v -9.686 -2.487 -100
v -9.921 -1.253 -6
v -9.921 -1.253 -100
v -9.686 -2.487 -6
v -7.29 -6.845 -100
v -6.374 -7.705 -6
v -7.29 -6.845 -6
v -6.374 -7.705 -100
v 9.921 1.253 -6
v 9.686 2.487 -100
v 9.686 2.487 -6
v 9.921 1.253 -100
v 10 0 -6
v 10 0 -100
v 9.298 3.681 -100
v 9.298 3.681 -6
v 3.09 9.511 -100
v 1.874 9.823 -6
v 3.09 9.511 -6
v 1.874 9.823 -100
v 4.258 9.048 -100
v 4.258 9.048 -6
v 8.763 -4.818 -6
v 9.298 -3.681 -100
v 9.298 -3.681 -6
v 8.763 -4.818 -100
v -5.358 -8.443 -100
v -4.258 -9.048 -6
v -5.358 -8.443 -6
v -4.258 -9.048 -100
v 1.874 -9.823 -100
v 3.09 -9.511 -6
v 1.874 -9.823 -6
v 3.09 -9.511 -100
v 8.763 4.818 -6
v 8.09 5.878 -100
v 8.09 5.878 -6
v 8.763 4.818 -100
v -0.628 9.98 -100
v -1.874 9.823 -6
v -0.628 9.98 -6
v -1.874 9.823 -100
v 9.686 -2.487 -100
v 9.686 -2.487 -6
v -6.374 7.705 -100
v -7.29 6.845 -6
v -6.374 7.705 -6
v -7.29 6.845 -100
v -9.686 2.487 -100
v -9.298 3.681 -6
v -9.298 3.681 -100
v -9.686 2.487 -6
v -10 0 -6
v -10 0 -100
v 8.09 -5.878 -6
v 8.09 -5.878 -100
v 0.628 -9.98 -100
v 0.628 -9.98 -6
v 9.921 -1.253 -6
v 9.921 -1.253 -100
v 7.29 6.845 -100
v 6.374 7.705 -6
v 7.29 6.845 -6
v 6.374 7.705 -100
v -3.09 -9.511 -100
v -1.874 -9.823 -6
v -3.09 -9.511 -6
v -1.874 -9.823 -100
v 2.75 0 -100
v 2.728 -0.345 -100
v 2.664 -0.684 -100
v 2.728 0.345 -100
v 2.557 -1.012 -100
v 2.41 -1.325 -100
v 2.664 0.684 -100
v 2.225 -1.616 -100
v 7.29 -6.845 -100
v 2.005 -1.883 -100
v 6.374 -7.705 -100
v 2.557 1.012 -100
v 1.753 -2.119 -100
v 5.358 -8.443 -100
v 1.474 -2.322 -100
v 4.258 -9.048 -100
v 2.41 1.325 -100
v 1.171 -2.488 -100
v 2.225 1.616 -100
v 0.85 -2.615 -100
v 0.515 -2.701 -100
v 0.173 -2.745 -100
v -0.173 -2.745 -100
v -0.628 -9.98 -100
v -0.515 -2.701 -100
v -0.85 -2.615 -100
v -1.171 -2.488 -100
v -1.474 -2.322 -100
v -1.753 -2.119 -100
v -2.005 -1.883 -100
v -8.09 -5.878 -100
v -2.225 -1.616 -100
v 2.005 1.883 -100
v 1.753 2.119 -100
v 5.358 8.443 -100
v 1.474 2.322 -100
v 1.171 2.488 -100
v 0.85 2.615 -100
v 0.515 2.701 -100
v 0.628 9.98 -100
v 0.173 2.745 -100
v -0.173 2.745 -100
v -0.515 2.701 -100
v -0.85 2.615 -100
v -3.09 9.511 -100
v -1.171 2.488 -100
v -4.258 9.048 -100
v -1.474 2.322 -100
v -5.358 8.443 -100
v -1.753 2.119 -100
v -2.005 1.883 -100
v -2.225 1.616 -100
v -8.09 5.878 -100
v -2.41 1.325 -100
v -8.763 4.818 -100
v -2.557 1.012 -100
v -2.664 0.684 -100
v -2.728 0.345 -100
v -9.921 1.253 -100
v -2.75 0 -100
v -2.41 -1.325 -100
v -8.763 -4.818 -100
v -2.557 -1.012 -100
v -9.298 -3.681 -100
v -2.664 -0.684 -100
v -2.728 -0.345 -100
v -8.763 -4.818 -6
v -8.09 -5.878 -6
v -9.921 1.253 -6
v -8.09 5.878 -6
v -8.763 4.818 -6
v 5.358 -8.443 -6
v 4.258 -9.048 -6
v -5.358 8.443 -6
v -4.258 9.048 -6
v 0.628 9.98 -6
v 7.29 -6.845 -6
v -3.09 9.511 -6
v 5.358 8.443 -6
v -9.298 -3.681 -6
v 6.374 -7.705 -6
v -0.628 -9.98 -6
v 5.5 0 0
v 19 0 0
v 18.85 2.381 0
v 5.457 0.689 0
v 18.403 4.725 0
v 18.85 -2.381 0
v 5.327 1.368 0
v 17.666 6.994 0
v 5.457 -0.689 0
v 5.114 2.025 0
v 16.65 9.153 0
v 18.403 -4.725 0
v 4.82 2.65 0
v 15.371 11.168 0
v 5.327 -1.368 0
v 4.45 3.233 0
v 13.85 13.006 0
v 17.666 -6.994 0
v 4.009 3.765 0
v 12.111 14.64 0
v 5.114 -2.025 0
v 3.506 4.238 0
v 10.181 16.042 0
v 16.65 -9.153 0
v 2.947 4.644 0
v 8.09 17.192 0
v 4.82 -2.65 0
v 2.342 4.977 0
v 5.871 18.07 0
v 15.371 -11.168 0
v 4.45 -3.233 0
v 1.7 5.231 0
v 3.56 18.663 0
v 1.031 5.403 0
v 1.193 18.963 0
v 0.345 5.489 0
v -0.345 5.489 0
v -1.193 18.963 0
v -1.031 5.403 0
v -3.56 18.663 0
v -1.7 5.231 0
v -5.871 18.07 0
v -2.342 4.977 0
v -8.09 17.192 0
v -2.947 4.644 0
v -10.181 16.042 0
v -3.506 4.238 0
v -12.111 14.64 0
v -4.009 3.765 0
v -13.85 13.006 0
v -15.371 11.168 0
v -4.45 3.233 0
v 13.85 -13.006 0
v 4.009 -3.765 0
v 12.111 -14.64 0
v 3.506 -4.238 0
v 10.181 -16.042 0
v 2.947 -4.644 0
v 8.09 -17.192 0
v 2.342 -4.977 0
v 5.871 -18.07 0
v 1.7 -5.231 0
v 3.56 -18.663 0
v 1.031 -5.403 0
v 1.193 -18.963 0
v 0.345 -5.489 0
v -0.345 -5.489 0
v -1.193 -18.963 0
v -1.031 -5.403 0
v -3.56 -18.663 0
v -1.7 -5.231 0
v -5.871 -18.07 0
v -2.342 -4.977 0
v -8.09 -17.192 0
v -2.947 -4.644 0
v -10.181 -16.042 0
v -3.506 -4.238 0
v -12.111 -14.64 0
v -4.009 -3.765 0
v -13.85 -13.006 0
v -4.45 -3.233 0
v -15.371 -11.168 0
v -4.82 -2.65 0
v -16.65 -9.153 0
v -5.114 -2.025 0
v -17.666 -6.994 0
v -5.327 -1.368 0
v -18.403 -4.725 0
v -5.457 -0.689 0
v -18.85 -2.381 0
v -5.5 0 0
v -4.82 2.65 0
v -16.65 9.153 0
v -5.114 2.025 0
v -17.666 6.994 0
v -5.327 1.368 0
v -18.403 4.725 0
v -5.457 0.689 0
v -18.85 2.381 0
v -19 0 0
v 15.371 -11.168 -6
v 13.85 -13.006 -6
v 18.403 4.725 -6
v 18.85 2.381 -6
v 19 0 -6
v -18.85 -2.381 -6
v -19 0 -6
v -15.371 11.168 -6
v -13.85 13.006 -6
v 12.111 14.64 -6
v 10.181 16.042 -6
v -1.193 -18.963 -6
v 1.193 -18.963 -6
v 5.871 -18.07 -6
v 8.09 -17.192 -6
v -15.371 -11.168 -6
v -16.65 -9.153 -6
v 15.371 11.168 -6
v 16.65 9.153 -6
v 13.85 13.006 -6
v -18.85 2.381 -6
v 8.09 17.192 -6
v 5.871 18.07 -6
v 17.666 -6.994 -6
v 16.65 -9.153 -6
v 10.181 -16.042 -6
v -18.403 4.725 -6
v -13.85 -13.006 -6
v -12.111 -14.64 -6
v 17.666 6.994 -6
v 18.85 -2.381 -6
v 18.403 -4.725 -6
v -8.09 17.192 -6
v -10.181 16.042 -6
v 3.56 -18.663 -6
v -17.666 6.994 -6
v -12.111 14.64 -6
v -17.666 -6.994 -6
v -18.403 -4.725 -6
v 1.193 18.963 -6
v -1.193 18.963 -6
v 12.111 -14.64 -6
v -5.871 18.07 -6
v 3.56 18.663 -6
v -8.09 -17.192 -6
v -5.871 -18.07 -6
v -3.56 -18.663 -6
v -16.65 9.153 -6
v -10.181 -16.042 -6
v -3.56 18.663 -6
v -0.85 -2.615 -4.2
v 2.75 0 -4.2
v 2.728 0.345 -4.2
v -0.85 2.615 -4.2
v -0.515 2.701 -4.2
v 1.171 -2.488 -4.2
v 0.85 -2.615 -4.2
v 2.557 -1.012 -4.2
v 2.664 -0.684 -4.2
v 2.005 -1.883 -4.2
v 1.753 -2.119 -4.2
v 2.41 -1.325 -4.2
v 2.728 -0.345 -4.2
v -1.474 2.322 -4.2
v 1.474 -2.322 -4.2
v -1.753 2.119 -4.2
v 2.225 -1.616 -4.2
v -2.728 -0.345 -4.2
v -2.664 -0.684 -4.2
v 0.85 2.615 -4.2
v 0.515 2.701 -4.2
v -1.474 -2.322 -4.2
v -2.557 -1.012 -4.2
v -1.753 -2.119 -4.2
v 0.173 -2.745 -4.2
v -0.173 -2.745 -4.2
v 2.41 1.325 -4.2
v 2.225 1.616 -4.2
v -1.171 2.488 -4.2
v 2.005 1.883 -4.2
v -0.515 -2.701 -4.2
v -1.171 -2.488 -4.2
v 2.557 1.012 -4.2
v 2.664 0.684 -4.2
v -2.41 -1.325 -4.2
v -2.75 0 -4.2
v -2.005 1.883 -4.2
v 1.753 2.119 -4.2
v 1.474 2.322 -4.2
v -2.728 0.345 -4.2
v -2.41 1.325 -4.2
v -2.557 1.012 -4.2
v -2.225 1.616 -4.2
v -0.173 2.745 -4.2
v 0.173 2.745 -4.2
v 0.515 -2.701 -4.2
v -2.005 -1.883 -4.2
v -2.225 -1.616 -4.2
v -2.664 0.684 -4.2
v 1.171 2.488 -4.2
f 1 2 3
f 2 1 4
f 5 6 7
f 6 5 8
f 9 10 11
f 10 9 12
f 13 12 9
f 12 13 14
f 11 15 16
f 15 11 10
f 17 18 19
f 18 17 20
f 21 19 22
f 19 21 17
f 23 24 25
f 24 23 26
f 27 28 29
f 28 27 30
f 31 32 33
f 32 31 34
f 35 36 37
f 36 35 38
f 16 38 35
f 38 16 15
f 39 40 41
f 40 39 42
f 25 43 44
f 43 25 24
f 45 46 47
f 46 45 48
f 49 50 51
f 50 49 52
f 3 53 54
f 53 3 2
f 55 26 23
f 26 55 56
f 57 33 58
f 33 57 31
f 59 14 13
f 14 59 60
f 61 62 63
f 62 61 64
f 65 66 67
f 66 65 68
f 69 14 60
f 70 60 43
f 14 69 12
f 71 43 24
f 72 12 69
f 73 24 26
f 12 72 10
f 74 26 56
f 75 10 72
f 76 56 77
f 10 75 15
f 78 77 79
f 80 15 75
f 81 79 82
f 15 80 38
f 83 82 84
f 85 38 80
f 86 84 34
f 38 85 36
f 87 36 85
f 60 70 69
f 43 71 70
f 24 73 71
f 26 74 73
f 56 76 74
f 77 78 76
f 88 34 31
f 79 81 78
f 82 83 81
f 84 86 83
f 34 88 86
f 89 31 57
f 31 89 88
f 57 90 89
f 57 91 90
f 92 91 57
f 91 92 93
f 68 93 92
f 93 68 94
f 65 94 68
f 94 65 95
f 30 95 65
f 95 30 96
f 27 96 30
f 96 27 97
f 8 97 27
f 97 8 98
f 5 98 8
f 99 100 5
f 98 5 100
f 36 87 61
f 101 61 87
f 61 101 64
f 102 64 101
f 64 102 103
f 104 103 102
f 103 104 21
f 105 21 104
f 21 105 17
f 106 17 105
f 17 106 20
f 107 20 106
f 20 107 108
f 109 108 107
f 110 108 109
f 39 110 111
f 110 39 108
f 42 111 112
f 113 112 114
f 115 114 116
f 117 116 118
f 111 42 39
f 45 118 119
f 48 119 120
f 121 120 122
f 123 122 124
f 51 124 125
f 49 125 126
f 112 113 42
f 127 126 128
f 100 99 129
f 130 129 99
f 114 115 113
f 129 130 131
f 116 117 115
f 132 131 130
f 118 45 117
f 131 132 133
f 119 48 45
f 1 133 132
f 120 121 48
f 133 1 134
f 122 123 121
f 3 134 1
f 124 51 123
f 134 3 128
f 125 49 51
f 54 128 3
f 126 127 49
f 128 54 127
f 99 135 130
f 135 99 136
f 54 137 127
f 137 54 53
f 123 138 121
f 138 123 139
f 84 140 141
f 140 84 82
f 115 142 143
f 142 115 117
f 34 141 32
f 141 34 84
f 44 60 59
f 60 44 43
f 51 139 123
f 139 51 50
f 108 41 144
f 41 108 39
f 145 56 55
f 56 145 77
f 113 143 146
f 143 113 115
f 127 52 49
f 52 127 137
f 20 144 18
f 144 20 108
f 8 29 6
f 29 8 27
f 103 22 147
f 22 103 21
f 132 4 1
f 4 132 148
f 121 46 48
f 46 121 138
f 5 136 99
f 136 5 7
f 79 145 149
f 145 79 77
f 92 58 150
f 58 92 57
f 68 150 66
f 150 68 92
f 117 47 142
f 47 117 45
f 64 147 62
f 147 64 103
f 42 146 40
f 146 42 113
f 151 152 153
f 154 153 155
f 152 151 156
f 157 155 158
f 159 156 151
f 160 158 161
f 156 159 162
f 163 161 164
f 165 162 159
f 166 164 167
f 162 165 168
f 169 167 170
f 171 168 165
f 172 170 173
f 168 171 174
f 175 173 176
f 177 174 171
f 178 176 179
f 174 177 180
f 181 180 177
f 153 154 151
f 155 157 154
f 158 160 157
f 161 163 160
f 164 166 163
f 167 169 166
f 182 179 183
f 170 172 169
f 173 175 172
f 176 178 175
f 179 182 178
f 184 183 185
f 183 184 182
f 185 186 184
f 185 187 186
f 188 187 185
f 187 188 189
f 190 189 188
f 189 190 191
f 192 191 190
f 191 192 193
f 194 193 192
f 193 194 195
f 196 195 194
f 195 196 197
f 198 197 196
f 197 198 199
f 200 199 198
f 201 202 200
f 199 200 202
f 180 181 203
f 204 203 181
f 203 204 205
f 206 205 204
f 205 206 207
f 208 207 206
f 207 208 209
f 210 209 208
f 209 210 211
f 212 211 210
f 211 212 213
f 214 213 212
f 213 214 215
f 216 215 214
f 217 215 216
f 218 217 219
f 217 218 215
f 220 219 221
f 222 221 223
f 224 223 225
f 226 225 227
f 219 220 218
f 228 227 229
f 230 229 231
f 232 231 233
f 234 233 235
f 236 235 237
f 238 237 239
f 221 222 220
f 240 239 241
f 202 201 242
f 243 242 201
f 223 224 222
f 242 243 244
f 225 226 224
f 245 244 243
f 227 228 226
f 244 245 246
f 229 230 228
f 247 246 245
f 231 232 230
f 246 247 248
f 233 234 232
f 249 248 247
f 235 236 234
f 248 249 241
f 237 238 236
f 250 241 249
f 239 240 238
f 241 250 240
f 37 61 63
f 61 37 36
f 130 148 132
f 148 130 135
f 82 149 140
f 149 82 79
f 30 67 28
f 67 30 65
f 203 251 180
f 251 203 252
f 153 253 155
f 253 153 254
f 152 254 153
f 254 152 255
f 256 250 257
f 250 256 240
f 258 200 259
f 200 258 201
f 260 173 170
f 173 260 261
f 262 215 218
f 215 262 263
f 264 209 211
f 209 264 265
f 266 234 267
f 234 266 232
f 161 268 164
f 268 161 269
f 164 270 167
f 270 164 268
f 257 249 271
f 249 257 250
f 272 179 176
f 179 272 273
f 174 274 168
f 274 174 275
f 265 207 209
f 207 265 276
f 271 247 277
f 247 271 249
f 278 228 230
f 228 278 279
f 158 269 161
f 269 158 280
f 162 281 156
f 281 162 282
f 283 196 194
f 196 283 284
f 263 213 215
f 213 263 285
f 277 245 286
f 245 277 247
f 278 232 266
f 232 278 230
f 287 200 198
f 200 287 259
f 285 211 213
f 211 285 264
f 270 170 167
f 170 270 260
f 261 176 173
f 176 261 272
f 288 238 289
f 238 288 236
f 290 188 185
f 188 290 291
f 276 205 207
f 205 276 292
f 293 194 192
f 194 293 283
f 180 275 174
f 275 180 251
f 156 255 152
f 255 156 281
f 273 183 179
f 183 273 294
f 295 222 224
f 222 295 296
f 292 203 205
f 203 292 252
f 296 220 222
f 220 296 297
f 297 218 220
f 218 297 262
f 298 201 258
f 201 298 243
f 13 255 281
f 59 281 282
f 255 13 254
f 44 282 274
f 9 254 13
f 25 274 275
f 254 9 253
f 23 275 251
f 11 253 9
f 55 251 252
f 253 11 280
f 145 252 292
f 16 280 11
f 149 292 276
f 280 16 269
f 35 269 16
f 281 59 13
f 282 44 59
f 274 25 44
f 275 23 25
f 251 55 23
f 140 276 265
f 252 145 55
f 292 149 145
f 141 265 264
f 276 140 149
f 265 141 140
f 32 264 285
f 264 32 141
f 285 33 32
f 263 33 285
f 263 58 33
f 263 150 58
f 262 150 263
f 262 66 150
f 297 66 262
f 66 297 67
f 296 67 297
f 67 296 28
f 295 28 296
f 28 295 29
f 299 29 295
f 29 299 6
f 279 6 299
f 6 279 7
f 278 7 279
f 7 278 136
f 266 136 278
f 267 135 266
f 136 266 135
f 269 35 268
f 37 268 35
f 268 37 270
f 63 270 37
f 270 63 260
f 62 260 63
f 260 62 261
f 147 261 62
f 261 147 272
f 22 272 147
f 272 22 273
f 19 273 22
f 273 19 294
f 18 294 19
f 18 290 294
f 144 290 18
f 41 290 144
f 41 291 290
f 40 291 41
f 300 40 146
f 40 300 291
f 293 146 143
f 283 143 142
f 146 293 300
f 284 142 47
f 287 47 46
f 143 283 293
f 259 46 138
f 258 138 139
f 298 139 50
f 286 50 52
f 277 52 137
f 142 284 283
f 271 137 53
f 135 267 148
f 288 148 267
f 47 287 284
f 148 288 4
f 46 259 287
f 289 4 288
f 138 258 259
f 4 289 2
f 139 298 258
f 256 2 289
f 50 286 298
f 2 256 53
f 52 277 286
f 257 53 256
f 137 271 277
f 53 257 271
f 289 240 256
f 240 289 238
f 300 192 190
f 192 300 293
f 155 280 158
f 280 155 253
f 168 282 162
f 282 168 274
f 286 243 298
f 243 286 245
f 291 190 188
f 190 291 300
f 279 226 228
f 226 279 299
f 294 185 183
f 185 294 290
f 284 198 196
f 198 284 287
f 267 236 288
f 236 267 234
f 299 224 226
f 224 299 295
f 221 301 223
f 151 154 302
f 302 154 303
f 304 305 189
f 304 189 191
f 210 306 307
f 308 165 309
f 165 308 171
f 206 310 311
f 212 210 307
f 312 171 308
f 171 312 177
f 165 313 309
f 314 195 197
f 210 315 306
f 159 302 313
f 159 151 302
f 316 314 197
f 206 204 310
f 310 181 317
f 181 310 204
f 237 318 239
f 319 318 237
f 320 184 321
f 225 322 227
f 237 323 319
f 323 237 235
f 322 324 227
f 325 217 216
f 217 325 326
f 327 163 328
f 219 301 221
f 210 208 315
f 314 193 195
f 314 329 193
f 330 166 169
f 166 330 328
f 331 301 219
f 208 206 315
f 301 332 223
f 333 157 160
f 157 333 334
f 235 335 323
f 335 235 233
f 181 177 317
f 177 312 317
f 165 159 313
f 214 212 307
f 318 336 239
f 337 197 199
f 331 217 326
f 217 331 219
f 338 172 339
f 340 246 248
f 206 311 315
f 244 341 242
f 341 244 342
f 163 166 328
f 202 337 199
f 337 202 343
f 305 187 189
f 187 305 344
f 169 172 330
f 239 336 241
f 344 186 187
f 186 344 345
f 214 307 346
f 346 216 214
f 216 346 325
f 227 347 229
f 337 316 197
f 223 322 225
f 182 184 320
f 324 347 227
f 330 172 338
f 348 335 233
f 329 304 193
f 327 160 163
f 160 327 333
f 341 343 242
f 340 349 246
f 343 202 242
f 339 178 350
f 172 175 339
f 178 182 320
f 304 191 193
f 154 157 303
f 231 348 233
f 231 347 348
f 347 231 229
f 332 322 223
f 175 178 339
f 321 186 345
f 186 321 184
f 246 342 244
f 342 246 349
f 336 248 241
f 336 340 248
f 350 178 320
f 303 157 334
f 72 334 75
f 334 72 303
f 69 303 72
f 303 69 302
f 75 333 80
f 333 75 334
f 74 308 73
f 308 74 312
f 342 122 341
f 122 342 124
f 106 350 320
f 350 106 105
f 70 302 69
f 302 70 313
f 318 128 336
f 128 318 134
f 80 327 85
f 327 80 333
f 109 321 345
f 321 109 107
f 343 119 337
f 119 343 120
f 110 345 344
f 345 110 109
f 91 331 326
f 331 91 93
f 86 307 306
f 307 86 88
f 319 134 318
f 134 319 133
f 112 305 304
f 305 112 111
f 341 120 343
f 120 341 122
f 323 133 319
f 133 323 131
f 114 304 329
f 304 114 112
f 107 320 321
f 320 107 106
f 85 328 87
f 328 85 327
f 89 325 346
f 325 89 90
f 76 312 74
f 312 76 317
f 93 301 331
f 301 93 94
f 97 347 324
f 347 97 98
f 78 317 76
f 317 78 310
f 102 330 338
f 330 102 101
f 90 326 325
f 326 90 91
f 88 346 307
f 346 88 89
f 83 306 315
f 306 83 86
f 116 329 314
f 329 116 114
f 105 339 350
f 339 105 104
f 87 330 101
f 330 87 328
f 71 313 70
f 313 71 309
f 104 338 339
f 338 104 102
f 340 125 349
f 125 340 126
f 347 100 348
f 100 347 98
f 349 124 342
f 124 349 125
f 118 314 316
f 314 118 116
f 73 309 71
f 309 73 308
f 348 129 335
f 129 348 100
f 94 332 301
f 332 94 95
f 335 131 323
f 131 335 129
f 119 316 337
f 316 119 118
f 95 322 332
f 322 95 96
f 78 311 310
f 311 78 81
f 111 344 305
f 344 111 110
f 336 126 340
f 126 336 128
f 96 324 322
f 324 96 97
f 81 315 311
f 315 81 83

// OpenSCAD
$fn = 50;


difference() {
	union() {
		translate(v = [0, 0, -100.0000000000]) {
			cylinder(h = 100, r = 10.0000000000);
		}
		translate(v = [0, 0, -6.0000000000]) {
			cylinder(h = 6, r = 19.0000000000);
		}
	}
	union() {
		translate(v = [0, 0, 0]) {
			rotate(a = [0, 0, 0]) {
				difference() {
					union() {
						#translate(v = [0, 0, -100.0000000000]) {
							cylinder(h = 100, r = 2.2500000000);
						}
						#translate(v = [0, 0, -4.2000000000]) {
							cylinder(h = 4.2000000000, r = 10.0000000000, r1 = 2.7500000000, r2 = 5.5000000000);
						}
						#translate(v = [0, 0, -100.0000000000]) {
							cylinder(h = 100, r = 2.7500000000);
						}
						#translate(v = [0, 0, -100.0000000000]) {
							cylinder(h = 100, r = 2.2500000000);
						}
					}
					union();
				}
			}
		}
	}
}
